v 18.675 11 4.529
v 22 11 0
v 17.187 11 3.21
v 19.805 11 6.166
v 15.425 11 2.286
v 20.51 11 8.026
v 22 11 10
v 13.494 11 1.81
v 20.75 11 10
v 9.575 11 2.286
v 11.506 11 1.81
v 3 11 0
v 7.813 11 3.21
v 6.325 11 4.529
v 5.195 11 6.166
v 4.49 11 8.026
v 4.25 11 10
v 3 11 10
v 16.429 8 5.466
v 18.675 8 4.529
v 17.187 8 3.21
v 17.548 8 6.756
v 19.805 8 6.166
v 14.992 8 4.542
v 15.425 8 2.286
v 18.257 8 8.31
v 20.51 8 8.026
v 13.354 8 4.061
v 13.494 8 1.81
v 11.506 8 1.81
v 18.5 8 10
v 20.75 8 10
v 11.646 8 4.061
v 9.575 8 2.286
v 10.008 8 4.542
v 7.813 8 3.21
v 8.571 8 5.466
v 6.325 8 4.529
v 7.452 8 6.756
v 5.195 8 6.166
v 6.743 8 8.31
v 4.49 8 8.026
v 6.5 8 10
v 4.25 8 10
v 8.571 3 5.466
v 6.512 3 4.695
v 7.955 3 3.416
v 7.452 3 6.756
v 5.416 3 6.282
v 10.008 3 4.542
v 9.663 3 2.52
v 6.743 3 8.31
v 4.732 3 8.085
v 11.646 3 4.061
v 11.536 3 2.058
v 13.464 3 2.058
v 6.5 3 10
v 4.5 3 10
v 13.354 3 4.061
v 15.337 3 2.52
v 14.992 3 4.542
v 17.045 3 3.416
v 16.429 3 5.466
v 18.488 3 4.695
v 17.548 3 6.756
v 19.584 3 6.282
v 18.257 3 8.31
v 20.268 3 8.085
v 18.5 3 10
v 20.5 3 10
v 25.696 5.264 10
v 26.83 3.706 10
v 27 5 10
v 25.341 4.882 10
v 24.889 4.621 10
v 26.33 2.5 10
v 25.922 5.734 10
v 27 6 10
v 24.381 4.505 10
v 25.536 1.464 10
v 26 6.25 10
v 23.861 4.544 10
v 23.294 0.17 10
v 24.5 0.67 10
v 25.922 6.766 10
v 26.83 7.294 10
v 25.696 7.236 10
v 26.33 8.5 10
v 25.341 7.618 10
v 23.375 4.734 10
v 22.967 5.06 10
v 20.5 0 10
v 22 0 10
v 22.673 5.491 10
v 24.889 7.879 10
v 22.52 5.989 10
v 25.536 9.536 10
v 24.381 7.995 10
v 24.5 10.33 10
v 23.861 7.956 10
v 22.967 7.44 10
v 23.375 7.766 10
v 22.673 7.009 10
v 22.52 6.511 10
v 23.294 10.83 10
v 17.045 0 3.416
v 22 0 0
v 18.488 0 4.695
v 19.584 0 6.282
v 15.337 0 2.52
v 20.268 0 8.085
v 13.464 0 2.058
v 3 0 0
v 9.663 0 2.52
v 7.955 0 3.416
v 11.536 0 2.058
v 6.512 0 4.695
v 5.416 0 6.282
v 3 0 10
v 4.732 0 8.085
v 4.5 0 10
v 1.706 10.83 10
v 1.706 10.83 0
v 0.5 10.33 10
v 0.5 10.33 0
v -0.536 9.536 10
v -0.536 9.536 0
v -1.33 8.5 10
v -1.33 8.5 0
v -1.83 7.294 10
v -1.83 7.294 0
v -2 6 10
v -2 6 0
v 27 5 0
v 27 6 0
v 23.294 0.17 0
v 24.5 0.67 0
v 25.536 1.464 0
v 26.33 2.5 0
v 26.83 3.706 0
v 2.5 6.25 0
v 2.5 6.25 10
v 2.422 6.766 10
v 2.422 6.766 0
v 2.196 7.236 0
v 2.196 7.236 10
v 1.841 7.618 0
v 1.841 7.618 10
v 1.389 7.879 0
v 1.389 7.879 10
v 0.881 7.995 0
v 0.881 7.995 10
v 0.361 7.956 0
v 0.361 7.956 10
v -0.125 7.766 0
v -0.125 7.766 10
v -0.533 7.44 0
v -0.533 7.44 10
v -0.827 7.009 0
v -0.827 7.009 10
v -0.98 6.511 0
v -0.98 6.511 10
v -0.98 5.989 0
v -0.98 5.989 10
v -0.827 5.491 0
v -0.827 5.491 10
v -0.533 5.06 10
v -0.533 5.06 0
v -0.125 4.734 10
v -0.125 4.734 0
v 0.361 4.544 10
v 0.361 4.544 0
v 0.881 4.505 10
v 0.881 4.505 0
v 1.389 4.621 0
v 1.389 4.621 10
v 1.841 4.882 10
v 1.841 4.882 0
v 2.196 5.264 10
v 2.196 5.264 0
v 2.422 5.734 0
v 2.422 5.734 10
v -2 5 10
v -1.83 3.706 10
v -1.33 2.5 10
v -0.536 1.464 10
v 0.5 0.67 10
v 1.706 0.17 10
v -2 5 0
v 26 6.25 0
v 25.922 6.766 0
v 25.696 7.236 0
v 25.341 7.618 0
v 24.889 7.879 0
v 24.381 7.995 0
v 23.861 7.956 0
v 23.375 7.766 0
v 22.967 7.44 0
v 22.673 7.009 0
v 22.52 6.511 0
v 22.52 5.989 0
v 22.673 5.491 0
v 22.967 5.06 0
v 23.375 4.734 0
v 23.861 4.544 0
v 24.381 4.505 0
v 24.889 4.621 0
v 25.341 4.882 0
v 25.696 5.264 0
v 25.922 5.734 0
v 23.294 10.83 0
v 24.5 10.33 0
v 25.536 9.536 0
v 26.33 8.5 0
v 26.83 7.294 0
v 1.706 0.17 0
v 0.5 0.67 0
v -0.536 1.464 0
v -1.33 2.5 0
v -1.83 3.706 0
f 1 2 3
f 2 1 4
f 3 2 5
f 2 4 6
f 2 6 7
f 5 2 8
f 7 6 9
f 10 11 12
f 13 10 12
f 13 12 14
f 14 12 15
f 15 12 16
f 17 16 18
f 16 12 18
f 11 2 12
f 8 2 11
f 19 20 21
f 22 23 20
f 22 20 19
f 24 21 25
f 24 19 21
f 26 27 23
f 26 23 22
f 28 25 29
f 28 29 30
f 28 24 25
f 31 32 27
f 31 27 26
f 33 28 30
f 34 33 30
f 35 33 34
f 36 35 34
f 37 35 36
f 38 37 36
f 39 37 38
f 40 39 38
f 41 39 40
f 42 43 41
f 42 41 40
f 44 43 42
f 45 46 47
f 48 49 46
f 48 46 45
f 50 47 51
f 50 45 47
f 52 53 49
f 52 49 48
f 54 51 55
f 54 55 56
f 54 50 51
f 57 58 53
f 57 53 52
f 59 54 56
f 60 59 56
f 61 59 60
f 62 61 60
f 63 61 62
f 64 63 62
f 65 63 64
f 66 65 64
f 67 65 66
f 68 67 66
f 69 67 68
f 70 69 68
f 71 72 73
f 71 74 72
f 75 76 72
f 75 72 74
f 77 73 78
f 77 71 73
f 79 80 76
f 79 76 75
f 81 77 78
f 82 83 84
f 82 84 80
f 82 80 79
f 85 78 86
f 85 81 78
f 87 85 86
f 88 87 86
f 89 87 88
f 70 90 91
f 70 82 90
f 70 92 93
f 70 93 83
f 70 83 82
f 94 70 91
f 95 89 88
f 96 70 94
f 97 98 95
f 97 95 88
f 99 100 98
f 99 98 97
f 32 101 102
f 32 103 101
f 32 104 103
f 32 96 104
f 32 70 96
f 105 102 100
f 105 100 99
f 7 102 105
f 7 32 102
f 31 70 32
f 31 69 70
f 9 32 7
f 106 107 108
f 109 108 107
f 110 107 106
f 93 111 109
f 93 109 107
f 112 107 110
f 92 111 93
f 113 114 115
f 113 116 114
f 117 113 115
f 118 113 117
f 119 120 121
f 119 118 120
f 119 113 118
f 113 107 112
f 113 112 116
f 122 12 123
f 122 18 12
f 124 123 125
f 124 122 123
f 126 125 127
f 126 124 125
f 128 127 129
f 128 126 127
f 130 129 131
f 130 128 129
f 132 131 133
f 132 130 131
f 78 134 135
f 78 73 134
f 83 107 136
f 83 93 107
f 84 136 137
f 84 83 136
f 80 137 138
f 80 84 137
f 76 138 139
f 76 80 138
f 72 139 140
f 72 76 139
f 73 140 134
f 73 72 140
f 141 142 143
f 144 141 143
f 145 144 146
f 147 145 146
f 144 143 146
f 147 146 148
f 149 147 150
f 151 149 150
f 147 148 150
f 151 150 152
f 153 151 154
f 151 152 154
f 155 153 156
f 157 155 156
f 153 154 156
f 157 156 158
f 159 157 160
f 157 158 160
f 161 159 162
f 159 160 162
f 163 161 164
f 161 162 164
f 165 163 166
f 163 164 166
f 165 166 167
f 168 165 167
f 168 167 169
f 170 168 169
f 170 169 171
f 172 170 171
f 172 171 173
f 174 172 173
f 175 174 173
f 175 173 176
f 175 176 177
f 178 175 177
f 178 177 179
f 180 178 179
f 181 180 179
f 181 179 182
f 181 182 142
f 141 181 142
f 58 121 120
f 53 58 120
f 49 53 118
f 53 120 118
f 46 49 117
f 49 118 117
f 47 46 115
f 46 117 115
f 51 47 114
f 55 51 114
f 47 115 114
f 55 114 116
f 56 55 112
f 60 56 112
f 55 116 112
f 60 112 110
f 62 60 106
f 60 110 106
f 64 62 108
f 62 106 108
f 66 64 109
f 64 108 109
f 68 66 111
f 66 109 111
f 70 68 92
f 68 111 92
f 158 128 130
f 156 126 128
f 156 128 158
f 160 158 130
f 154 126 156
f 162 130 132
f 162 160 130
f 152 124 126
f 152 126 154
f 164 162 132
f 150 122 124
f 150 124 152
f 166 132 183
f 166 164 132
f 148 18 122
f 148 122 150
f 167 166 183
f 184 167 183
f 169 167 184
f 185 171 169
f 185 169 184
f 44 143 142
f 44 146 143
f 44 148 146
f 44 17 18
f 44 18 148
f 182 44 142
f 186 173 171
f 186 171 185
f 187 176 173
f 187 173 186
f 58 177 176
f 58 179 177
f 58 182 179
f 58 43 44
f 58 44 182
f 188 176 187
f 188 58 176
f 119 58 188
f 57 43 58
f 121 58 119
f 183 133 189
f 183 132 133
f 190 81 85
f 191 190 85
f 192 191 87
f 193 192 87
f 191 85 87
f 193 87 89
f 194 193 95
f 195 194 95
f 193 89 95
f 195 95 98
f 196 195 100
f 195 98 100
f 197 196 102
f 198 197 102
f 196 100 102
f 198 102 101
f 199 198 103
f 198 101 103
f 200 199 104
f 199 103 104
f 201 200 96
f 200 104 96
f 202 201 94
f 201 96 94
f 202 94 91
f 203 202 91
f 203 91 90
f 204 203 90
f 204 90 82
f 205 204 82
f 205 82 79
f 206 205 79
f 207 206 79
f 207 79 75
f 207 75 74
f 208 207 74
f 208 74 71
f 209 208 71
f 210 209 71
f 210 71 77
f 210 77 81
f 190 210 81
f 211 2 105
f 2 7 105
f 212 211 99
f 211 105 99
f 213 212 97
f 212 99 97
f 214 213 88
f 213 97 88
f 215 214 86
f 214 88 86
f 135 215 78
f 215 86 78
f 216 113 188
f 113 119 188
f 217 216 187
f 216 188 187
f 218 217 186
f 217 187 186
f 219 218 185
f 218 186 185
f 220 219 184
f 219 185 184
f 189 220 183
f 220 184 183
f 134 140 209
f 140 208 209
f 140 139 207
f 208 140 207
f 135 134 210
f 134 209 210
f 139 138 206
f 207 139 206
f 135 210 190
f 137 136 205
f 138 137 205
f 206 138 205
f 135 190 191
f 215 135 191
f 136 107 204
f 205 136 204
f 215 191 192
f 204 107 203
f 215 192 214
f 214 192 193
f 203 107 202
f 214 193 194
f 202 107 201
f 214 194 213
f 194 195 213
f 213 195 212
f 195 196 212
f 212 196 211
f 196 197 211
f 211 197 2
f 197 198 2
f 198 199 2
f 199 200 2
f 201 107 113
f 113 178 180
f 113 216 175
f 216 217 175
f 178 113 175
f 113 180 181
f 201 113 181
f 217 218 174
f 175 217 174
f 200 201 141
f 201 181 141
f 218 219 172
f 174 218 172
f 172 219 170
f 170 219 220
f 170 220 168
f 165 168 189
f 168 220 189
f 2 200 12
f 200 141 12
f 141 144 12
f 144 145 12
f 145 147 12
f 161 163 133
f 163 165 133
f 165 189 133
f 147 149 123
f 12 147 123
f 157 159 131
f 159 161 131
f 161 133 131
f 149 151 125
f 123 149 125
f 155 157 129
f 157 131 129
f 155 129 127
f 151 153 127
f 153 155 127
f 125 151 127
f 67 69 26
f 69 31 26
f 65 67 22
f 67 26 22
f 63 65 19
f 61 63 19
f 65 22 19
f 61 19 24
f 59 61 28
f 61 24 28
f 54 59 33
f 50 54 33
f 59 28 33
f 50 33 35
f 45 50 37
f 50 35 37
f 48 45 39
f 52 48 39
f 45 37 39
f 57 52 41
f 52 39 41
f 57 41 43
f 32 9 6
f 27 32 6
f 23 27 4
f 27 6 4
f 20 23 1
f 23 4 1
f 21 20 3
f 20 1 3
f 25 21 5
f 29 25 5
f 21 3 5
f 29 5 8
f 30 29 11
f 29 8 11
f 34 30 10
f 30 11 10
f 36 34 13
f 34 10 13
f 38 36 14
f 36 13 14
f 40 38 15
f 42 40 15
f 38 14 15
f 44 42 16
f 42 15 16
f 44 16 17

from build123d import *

# Parameters (mm, degrees)
F0_W      = 25
F0_H      = 11
F1_DEPTH  = 10
F2_R      = 8
F3_DEPTH  = 3
F4_R      = 6
F5_DEPTH  = 9
F6_W      = 11
F6_H      = 10
F7_DEPTH  = 2
F8_W      = 11
F8_H      = 10
F9_DEPTH  = 2
F10_R     = 5
F11_R     = 1.75
F12_DEPTH = 25
F13_R     = 8.25
F14_DEPTH = 3


with BuildPart() as f1:
    # F0 (on Top) → F1 (new body)
    with BuildSketch(Plane.XY):
        with Locations((12.5, 5.5)):
            Rectangle(F0_W, F0_H)
    extrude(amount=F1_DEPTH)

    # F2 (on face) → F3 (cut)
    with BuildSketch(Plane.XZ):
        with Locations((12.5, 10)):
            Circle(F2_R)
    extrude(amount=-F3_DEPTH, mode=Mode.SUBTRACT)

    # F4 (on face) → F5 (cut)
    with BuildSketch(Plane(origin=(0, 11, 0), x_dir=(-1, 0, 0), z_dir=(0, 1, 0))):
        with Locations((-12.5, 10)):
            Circle(F4_R)
    extrude(amount=-F5_DEPTH, mode=Mode.SUBTRACT)

    # F6 (on face) → F7 (join)
    with BuildSketch(Plane(origin=(0, 0, 0), x_dir=(0, -1, 0), z_dir=(-1, 0, 0))):
        with Locations((-5.5, 5)):
            Rectangle(F6_W, F6_H)
    extrude(amount=F7_DEPTH)

    # F8 (on face) → F9 (join)
    with BuildSketch(Plane.YZ.offset(25)):
        with Locations((5.5, 5)):
            Rectangle(F8_W, F8_H)
    extrude(amount=F9_DEPTH)

    # F10
    f10_edges = [f1.edges().sort_by_distance(p)[0] for p in [
        (27, 11, 5),
        (27, 0, 5),
        (-2, 11, 5),
        (-2, 0, 5),
    ]]
    fillet(f10_edges, radius=F10_R)

    # F11 (on face) → F12 (cut)
    with BuildSketch(Plane.XY.offset(10)):
        with Locations((0.75, 6.25)):
            Circle(F11_R)
        with Locations((24.25, 6.25)):
            Circle(F11_R)
    extrude(amount=-F12_DEPTH, mode=Mode.SUBTRACT)

    # F13 (on face) → F14 (cut)
    with BuildSketch(Plane(origin=(0, 11, 0), x_dir=(-1, 0, 0), z_dir=(0, 1, 0))):
        with Locations((-12.5, 10)):
            Circle(F13_R)
    extrude(amount=-F14_DEPTH, mode=Mode.SUBTRACT)


solid = f1.part
